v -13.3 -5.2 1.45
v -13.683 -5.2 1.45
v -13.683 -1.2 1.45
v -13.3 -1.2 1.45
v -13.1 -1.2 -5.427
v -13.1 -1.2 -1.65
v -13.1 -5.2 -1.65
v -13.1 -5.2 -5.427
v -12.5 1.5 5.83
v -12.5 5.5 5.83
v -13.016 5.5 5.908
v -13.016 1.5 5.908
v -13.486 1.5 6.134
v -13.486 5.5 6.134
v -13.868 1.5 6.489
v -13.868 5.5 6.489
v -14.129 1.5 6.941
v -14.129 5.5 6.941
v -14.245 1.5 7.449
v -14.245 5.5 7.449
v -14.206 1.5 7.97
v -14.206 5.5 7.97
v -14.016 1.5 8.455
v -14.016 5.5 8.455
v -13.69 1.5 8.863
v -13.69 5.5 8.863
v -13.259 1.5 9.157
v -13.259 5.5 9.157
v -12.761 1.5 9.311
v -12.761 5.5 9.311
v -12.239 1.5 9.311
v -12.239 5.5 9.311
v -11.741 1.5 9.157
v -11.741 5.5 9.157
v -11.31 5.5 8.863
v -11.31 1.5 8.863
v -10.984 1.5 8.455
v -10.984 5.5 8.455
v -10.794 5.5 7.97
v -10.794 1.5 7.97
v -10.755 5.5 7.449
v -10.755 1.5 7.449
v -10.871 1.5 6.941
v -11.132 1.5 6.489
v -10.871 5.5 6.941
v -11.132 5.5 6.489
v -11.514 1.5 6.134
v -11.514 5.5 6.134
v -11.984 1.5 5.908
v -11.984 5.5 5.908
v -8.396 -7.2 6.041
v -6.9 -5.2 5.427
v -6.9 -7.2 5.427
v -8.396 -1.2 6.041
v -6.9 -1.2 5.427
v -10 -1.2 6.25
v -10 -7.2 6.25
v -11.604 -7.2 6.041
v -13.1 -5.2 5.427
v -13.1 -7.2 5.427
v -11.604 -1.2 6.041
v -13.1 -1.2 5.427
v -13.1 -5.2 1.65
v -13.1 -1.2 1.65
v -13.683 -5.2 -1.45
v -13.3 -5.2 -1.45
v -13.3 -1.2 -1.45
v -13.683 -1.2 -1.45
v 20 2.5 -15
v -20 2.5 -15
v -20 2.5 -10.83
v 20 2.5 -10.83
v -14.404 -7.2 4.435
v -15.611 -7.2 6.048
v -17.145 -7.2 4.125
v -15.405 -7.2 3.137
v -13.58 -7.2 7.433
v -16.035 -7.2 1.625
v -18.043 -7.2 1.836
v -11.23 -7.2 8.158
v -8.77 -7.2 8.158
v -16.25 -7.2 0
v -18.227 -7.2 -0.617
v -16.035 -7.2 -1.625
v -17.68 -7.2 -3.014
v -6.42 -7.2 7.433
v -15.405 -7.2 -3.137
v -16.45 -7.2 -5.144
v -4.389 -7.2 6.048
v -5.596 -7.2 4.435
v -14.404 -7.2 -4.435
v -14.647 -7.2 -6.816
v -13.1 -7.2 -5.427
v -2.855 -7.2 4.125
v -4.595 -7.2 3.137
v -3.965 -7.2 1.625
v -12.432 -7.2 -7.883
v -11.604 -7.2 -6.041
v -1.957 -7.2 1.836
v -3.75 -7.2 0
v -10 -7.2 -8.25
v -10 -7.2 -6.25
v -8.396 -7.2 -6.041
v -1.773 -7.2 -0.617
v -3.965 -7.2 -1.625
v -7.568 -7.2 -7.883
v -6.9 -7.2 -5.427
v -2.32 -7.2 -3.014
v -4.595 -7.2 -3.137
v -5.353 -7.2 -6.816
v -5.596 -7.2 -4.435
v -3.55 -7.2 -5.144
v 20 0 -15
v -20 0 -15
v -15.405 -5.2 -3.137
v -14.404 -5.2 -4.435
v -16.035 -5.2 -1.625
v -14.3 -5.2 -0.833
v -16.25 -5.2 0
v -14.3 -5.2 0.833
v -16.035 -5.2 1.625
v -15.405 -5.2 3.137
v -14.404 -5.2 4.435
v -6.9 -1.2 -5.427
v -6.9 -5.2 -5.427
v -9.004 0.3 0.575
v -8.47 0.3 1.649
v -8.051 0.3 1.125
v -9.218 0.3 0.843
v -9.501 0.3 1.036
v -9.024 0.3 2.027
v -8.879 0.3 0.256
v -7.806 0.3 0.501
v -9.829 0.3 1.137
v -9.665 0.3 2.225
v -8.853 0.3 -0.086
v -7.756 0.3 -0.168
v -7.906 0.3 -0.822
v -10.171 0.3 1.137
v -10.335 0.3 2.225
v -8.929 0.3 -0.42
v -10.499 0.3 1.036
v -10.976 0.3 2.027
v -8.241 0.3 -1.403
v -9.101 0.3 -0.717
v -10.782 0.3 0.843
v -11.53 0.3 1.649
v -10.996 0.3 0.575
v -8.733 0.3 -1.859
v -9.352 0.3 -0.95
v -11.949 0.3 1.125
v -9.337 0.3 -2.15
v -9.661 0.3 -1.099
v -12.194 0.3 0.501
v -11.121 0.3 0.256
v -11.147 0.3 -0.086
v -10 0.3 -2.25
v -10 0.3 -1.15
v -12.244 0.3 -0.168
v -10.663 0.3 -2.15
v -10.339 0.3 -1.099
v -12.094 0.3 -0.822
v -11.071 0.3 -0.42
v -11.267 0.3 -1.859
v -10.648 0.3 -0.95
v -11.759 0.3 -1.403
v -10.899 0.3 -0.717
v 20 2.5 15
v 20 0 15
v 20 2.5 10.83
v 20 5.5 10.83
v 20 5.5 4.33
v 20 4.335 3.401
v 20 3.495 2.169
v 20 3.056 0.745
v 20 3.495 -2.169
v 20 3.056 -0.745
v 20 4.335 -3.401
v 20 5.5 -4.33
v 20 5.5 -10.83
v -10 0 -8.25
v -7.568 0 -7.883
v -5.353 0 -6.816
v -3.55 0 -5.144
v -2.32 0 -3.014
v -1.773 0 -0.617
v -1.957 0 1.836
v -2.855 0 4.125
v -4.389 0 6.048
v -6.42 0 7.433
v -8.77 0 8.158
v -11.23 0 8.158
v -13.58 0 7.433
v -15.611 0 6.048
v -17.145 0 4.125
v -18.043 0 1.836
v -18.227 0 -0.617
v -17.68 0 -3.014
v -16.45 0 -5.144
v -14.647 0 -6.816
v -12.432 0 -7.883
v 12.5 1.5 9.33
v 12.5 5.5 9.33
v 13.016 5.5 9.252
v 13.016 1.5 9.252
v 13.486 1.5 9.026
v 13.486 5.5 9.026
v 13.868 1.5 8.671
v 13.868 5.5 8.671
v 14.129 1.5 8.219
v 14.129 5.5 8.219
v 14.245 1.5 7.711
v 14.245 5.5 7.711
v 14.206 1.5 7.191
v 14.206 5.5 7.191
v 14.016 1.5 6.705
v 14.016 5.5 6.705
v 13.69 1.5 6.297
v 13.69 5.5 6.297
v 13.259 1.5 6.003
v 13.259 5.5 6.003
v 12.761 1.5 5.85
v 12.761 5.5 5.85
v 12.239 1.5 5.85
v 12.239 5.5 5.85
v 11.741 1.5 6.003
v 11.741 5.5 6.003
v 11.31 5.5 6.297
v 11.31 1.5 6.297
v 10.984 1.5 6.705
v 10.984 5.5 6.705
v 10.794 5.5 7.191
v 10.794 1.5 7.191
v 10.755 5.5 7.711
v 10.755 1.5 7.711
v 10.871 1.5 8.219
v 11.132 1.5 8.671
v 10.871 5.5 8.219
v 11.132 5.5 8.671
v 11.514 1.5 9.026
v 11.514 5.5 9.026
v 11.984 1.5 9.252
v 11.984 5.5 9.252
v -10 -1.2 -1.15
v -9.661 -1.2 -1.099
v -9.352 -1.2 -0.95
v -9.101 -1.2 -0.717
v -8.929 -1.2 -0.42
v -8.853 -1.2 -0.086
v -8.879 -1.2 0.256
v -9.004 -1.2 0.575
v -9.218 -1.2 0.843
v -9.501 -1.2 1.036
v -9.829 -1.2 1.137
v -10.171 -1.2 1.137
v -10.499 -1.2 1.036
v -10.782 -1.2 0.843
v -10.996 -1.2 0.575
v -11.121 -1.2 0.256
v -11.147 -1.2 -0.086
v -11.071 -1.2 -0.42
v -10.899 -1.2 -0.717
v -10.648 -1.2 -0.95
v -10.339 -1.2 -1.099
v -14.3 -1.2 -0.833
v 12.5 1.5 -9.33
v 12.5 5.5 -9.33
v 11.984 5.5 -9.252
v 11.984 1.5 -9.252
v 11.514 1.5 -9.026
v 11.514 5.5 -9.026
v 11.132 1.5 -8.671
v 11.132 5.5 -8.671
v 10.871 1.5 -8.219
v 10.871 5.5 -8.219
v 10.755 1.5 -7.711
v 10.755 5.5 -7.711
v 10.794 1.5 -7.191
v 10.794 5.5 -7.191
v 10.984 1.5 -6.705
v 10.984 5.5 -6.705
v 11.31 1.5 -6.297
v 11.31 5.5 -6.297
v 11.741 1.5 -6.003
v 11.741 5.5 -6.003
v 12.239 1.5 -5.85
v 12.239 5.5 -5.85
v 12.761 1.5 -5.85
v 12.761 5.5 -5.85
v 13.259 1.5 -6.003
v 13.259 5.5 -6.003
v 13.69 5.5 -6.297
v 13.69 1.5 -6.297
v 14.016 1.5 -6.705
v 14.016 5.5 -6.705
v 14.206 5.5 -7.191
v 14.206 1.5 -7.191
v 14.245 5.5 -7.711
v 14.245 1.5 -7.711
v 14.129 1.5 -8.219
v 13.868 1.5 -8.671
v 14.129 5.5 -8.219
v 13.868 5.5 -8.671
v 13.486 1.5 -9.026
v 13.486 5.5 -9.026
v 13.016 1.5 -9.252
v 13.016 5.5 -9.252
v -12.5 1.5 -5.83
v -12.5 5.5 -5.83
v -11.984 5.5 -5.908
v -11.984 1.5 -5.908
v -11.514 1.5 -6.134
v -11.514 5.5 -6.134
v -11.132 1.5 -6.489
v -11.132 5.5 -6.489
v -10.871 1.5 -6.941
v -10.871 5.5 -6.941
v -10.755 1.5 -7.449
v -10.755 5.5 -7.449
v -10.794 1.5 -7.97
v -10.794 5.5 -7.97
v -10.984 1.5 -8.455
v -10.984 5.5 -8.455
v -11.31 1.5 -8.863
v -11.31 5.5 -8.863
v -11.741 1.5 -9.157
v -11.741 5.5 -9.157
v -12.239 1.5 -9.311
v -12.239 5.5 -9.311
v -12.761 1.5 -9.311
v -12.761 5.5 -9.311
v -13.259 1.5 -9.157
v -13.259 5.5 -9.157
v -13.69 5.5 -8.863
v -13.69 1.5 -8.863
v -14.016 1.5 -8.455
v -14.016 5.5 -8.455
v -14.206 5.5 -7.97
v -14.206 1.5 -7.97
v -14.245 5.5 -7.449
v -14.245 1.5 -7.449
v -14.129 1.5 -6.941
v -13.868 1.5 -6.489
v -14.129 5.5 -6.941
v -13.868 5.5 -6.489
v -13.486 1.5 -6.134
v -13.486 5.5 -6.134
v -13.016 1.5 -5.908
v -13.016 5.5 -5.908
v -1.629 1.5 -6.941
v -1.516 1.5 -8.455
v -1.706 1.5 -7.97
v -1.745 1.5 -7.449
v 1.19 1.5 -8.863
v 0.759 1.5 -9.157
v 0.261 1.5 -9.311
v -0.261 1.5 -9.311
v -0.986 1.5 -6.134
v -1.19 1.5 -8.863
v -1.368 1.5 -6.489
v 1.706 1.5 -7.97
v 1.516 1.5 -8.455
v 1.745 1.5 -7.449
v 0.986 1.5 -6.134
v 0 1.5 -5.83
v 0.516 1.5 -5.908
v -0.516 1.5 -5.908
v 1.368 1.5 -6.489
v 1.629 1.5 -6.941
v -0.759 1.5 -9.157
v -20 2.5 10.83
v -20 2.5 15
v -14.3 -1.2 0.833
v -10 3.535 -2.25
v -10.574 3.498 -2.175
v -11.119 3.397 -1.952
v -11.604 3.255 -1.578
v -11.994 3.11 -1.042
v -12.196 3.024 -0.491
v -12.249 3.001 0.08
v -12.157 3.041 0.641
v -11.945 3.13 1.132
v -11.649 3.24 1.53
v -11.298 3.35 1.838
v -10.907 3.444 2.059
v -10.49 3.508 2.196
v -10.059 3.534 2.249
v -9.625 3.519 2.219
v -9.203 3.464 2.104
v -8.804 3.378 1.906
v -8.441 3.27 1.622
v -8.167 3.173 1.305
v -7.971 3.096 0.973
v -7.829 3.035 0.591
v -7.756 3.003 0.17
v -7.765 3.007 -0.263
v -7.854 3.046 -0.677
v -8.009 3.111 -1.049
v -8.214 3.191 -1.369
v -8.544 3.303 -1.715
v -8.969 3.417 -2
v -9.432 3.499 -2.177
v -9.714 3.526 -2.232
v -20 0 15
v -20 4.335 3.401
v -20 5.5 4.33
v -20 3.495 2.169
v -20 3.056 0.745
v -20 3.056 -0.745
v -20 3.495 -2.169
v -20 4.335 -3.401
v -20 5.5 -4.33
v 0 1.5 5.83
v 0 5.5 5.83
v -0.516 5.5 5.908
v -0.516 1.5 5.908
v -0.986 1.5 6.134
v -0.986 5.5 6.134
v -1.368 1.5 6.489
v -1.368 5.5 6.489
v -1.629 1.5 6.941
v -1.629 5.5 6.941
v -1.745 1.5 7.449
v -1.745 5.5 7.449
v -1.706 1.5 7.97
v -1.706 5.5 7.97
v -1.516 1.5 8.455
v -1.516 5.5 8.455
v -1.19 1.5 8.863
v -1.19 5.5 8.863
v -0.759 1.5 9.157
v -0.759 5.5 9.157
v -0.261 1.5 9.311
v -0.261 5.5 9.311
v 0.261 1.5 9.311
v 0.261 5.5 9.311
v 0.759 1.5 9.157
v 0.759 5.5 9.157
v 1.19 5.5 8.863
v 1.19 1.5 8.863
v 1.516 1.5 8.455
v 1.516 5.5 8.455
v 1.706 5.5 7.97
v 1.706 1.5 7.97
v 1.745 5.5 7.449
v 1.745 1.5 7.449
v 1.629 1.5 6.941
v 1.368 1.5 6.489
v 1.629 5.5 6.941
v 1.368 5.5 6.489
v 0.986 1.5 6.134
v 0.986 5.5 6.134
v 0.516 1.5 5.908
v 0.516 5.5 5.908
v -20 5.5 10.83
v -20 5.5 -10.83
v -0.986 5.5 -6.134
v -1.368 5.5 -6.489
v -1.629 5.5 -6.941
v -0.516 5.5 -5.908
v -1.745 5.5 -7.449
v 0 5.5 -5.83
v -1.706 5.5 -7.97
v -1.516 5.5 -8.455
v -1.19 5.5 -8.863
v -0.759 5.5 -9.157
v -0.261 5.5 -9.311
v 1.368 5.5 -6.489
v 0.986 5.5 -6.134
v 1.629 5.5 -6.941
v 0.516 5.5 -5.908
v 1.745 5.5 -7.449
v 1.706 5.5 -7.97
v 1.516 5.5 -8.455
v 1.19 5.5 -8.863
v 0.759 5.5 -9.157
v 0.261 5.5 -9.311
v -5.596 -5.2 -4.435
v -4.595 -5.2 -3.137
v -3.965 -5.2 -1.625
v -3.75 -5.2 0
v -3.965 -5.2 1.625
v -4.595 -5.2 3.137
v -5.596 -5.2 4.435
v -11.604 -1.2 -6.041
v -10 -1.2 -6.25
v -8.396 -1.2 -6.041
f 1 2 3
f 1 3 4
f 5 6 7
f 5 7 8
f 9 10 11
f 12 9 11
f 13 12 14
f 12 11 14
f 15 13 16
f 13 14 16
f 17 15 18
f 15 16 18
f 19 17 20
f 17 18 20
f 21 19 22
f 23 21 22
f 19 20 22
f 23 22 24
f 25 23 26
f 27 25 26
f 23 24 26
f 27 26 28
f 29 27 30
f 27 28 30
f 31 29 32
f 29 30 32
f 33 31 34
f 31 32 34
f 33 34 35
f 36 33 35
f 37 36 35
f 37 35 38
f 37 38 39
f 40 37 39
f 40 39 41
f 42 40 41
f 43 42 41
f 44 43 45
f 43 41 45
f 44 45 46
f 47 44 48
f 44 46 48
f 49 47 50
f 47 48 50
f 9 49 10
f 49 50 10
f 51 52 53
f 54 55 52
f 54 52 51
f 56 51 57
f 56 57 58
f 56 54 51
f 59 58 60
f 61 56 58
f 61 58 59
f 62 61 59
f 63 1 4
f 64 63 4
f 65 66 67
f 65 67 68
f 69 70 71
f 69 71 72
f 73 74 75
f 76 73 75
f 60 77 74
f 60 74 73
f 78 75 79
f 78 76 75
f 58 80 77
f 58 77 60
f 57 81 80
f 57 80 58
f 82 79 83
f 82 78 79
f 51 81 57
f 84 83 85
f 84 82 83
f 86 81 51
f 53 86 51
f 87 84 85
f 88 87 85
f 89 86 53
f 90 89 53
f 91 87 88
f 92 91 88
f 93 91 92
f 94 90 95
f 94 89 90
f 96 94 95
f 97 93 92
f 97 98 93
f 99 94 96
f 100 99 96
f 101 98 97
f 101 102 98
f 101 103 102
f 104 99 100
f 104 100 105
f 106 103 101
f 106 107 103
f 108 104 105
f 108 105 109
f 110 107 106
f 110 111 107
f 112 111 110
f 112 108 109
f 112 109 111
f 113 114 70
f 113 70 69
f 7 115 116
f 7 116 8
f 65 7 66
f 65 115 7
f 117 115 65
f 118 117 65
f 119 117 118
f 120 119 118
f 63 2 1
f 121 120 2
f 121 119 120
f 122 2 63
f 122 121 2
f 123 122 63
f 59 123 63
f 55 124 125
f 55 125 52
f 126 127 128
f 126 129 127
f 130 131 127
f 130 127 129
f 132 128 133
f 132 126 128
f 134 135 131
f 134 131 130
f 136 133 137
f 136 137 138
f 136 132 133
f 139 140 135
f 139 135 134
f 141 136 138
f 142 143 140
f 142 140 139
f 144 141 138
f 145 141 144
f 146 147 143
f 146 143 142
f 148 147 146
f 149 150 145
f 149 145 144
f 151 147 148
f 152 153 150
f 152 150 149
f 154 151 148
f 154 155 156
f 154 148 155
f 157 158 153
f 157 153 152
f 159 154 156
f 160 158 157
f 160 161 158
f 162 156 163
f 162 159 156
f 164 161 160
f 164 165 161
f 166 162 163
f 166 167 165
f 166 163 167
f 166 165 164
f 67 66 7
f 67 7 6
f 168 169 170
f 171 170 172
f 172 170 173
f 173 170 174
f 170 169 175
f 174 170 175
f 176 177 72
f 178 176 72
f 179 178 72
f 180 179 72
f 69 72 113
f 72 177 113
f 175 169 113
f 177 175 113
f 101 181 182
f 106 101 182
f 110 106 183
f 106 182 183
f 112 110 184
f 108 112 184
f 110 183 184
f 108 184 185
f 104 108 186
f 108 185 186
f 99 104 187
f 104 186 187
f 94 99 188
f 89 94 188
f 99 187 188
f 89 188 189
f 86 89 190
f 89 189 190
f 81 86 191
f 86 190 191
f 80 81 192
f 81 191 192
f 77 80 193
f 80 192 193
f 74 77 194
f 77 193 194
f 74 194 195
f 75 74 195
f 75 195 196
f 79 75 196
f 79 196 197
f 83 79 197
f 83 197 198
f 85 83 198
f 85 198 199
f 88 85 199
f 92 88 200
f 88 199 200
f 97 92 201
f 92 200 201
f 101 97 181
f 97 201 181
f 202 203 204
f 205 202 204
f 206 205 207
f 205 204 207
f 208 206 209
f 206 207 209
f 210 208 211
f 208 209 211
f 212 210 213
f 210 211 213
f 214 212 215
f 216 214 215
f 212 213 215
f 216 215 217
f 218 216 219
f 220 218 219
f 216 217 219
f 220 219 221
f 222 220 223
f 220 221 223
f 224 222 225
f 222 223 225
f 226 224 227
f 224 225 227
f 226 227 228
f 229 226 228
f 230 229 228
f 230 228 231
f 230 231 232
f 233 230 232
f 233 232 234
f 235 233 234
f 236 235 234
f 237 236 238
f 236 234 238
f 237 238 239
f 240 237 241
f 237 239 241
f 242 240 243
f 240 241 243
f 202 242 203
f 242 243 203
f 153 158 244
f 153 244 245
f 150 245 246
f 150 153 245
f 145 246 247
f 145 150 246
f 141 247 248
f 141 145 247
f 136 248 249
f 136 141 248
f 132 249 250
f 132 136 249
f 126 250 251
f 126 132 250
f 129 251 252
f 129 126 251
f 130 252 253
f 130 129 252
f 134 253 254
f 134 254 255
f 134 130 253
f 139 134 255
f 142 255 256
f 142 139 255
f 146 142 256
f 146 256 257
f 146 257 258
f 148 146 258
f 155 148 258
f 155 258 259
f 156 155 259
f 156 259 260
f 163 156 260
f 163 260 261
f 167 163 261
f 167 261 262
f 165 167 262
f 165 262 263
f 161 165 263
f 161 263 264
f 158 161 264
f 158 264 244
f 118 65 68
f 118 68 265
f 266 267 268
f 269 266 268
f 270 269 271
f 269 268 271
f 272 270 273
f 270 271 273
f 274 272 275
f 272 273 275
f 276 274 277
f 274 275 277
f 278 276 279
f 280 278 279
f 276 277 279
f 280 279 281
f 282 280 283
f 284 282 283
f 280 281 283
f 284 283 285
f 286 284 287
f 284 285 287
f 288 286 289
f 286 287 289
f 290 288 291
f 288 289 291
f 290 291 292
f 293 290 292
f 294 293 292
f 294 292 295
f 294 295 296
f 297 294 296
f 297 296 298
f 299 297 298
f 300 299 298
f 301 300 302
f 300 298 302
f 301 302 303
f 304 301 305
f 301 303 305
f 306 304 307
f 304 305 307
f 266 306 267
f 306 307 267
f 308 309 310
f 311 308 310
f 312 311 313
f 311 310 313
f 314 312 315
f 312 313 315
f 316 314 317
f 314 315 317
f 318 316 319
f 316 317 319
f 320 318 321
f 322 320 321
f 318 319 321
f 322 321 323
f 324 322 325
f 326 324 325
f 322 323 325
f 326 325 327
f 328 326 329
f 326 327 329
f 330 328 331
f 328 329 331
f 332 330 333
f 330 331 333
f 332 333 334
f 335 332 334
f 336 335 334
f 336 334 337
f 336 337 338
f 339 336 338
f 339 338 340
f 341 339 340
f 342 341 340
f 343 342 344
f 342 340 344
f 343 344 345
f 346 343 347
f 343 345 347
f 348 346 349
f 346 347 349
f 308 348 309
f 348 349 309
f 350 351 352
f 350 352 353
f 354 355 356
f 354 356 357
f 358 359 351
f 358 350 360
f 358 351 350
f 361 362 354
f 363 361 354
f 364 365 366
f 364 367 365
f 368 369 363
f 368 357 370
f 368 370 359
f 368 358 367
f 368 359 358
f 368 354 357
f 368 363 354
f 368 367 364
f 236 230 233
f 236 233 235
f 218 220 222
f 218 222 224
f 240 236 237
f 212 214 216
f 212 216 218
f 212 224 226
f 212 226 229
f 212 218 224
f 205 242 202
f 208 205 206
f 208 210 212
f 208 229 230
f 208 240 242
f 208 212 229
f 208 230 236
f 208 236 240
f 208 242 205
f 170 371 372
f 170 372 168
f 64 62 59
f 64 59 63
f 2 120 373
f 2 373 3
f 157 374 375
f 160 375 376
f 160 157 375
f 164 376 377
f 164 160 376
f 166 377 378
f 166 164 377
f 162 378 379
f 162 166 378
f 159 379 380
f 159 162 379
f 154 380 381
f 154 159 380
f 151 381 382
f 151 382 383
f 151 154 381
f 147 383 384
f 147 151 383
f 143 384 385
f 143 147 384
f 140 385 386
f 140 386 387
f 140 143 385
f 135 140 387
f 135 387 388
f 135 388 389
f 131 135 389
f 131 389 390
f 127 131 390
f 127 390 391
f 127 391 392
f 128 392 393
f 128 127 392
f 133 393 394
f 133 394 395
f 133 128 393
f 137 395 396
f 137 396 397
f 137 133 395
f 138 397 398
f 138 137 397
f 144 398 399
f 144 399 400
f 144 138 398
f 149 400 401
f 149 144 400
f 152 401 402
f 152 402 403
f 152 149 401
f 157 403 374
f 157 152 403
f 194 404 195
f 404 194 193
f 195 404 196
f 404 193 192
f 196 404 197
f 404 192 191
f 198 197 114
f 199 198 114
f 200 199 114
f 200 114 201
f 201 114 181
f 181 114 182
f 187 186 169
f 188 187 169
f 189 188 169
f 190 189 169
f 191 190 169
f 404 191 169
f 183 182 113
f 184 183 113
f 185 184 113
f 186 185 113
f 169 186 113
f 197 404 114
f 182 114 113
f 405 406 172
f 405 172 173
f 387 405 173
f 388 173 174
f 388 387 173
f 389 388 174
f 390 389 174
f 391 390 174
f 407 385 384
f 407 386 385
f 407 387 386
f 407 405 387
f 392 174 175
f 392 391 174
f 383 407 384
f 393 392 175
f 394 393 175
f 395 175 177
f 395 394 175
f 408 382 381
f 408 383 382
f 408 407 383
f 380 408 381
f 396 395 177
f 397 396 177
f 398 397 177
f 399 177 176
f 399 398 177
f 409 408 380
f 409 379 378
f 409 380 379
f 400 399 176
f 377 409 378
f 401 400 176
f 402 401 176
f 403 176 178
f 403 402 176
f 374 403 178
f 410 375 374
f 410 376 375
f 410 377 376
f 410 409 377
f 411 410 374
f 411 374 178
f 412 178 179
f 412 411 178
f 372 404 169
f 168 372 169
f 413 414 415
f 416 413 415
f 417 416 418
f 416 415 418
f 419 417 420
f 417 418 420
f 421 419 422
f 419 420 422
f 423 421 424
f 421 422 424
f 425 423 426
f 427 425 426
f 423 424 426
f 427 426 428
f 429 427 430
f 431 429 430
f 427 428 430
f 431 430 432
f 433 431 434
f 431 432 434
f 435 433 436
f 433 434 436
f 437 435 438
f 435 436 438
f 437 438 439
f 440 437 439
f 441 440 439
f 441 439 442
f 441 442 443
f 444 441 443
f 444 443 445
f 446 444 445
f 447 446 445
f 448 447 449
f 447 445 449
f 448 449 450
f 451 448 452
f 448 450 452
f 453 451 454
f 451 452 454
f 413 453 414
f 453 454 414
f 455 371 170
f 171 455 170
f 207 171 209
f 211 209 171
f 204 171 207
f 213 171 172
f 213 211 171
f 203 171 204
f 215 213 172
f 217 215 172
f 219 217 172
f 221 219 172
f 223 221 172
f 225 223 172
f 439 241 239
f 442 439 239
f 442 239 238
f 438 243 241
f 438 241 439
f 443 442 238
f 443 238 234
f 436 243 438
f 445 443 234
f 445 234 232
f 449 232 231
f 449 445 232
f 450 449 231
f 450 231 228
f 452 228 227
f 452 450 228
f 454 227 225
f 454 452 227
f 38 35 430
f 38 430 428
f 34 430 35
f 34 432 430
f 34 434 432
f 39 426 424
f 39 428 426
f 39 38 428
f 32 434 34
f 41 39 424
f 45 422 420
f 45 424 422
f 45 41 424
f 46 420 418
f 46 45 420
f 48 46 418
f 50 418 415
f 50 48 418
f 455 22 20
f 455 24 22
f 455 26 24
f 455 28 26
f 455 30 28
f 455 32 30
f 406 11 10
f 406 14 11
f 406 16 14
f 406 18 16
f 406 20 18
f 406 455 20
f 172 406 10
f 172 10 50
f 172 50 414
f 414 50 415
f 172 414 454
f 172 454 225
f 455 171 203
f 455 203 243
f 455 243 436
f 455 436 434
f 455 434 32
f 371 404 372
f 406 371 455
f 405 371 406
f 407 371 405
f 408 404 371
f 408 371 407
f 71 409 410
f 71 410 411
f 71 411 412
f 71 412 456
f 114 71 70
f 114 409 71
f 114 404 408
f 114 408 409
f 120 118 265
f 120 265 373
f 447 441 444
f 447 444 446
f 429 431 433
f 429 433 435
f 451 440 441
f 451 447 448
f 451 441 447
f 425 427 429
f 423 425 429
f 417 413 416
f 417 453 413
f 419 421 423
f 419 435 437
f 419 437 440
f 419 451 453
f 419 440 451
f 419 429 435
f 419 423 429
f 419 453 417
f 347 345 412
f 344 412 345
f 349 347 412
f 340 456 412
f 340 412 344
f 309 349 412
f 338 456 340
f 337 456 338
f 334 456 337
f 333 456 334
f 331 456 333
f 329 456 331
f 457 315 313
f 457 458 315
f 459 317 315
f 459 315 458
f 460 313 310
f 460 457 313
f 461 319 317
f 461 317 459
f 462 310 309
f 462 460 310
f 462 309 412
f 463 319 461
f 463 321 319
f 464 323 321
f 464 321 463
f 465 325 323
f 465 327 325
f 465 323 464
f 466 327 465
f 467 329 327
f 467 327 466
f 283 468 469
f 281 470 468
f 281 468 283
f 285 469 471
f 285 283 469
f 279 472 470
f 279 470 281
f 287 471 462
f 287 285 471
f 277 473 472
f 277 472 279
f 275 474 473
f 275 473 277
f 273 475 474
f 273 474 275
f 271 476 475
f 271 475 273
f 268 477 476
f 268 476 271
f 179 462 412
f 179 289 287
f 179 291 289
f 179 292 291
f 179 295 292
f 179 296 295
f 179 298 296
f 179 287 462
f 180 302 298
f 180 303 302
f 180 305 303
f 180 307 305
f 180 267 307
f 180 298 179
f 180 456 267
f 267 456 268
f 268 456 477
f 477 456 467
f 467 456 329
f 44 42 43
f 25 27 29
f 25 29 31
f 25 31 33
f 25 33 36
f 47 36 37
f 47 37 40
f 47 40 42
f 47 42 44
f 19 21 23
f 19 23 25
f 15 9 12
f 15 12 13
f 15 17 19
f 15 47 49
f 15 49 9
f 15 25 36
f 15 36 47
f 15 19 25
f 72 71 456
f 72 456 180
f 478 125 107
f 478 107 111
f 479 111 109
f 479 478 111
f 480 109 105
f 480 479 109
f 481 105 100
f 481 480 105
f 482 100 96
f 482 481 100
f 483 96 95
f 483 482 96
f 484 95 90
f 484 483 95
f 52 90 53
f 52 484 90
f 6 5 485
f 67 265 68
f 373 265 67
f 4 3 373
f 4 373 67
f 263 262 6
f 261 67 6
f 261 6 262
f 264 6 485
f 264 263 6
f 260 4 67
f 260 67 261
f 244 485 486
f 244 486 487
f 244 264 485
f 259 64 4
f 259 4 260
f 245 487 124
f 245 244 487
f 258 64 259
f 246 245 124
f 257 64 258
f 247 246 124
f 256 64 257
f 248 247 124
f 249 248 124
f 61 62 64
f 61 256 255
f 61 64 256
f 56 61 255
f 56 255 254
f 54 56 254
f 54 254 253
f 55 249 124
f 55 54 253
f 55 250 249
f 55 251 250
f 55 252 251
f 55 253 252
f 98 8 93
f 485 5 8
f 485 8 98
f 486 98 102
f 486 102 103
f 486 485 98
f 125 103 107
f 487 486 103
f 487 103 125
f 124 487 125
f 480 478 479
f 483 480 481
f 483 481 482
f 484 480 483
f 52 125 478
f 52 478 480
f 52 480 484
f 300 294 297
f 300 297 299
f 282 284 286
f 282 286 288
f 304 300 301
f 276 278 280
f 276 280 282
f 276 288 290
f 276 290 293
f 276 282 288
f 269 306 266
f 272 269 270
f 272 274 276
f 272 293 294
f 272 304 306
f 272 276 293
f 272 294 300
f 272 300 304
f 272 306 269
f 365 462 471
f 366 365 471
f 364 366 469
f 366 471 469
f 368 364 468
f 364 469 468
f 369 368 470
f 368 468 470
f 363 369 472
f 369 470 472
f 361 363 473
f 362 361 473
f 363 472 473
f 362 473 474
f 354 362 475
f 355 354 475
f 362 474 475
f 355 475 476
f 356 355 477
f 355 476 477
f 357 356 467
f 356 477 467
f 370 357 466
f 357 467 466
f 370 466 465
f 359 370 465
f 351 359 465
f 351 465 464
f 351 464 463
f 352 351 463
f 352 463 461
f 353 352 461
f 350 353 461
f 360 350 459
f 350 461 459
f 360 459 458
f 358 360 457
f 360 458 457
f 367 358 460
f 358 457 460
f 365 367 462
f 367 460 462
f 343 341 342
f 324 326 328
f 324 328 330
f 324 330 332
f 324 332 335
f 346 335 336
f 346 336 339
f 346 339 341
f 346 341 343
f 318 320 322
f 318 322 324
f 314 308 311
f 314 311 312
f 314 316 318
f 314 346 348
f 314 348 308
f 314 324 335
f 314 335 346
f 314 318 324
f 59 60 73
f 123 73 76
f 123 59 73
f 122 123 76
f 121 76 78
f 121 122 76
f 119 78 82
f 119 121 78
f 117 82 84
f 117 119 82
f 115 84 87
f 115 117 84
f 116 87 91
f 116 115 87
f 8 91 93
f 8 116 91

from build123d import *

# Parameters (mm, degrees)
SKETCH_1_W                           = 40
SKETCH_1_H                           = 30
EXTRUDE_1_DEPTH                      = 2.5
SKETCH_2_R                           = 8.25
EXTRUDE_2_DEPTH                      = 7.2
CUT_EXTRUDE_START                    = -2
SKETCH_3_R                           = 6.25
CUT_EXTRUDE_1_DEPTH                  = 2
EXTRUDE_4_DEPTH                      = 1.2
SKETCH_4_R                           = 1.15
CUT_EXTRUDE_2_DEPTH                  = 3.7
CUT_EXTRUDE_4_DEPTH                  = 4
CHAMFER_1_SIZE                       = 0.2
EXTRUDE_5_DEPTH                      = 40
SKETCH_9_R                           = 2.25
CUT_EXTRUDE_5_DEPTH                  = 2.2
CUT_EXTRUDE_5_DIRECTION_2_REACH      = 28.816
CUT_EXTRUDE_5_DIRECTION_2_END_RADIUS = 5
SKETCH_13_W                          = 40
SKETCH_13_H                          = 5
EXTRUDE_6_DEPTH                      = 3
SKETCH_14_R                          = 1.75
CUT_EXTRUDE_7_DEPTH                  = 4


with BuildPart() as part:
    # Эскиз1 → Бобышка-Вытянуть1 (new body)
    with BuildSketch(Plane(origin=(0, 0, 0), x_dir=(1, 0, 0), z_dir=(0, 1, 0))):
        Rectangle(SKETCH_1_W, SKETCH_1_H)
    extrude(amount=EXTRUDE_1_DEPTH)

    # Эскиз2 → Бобышка-Вытянуть2 (add)
    with BuildSketch(Plane.XZ):
        with Locations(Location((-10, 0, 0), (0, 0, 270))):
            Circle(SKETCH_2_R)
        with BuildLine():
            Line((-13.1, 5.427015755), (-13.1, -5.427015755))
            ThreePointArc((-13.1, -5.427015755), (-10, -6.25), (-6.9, -5.427015755))
            Line((-6.9, -5.427015755), (-6.9, 5.427015755))
            ThreePointArc((-6.9, 5.427015755), (-10, 6.25), (-13.1, 5.427015755))
        make_face(mode=Mode.SUBTRACT)
    extrude(amount=EXTRUDE_2_DEPTH)

    # Эскиз3 → Вырез-Вытянуть1 (cut)
    with BuildSketch(Plane.XZ.offset(7.2).offset(CUT_EXTRUDE_START)):
        with Locations(Location((-10, 0, 0), (0, 0, 60.264286892))):
            Circle(SKETCH_3_R)
    extrude(amount=CUT_EXTRUDE_1_DEPTH, mode=Mode.SUBTRACT)

    # Эскиз8 → Бобышка-Вытянуть4 (add)
    with BuildSketch(Plane.XZ):
        with BuildLine():
            Line((-13.1, 5.427015755), (-13.1, -5.427015755))
            ThreePointArc((-13.1, -5.427015755), (-10, -6.25), (-6.9, -5.427015755))
            Line((-6.9, -5.427015755), (-6.9, 5.427015755))
            ThreePointArc((-6.9, 5.427015755), (-10, 6.25), (-13.1, 5.427015755))
        make_face()
    extrude(amount=EXTRUDE_4_DEPTH)

    # Эскиз4 → Вырез-Вытянуть2 (cut)
    with BuildSketch(Plane.XZ.offset(-2.5)):
        with Locations(Location((-10, 0, 0), (0, 0, 270))):
            Circle(SKETCH_4_R)
    extrude(amount=CUT_EXTRUDE_2_DEPTH, mode=Mode.SUBTRACT)

    # Эскиз6 → Вырез-Вытянуть4 (cut)
    with BuildSketch(Plane.XZ.offset(5.2)):
        Polygon((-13.1, 1.25), (-13.1, -1.25), (-13.1, -1.45), (-13.682842712, -1.45), (-14.3, -0.832842712), (-14.3, 0.832842712), (-13.682842712, 1.45), (-13.1, 1.45), align=None)
    extrude(amount=-CUT_EXTRUDE_4_DEPTH, mode=Mode.SUBTRACT)

    # Фаска1
    chamfer_1_edges = [part.edges().sort_by_distance(p)[0] for p in [
        (-13.1, -3.2, -1.45),
        (-13.1, -3.2, 1.45),
    ]]
    chamfer(chamfer_1_edges, length=CHAMFER_1_SIZE)

    # Эскиз10 → Бобышка-Вытянуть5 (add)
    with BuildSketch(Plane.ZY.offset(20)):
        with BuildLine():
            Line((-5.830127019, 5.5), (-5.830127019, 2.5))
            Line((-5.830127019, 2.5), (5.830127019, 2.5))
            Line((5.830127019, 2.5), (5.830127019, 5.5))
            Line((5.830127019, 5.5), (4.330127019, 5.5))
            ThreePointArc((4.330127019, 5.5), (0, 3), (-4.330127019, 5.5))
            Line((-4.330127019, 5.5), (-5.830127019, 5.5))
        make_face()
    extrude(amount=-EXTRUDE_5_DEPTH)

    # Эскиз9 → Вырез-Вытянуть5 (cut)
    with BuildSketch(Plane(origin=(0, 2.5, 0), x_dir=(1, 0, 0), z_dir=(0, 1, 0))):
        with Locations(Location((-10, 0, 0), (0, 0, 90))):
            Circle(SKETCH_9_R)
    extrude(amount=-CUT_EXTRUDE_5_DEPTH, mode=Mode.SUBTRACT)

    # Вырез-Вытянуть5 direction 2: up to this cylinder (the profile starts outside it)
    cut_extrude_5_direction_2_end = Plane(origin=(-10, 8, 0), z_dir=(-1, 0, 0)) * Cylinder(CUT_EXTRUDE_5_DIRECTION_2_END_RADIUS, 68.632, mode=Mode.PRIVATE)
    # Эскиз9 → Вырез-Вытянуть5 direction 2 (cut, up to the surface)
    with BuildSketch(Plane(origin=(0, 2.5, 0), x_dir=(1, 0, 0), z_dir=(0, 1, 0)), mode=Mode.PRIVATE) as cut_extrude_5_direction_2_sk1:
        with Locations(Location((-10, 0, 0), (0, 0, 90))):
            Circle(SKETCH_9_R)
    cut_extrude_5_direction_2_tool1 = extrude(cut_extrude_5_direction_2_sk1.sketch, amount=CUT_EXTRUDE_5_DIRECTION_2_REACH, mode=Mode.PRIVATE) - cut_extrude_5_direction_2_end
    add(cut_extrude_5_direction_2_tool1.solids().sort_by_distance((-10, 2.5, 0))[0], mode=Mode.SUBTRACT)

    # Эскиз13 → Бобышка-Вытянуть6 (add)
    with BuildSketch(Plane(origin=(0, 2.5, 0), x_dir=(1, 0, 0), z_dir=(0, 1, 0))):
        with Locations((0, 8.330127019)):
            Rectangle(SKETCH_13_W, SKETCH_13_H)
        with Locations((0, -8.330127019)):
            Rectangle(SKETCH_13_W, SKETCH_13_H)
    extrude(amount=EXTRUDE_6_DEPTH)

    # Эскиз14 → Вырез-Вытянуть7 (cut)
    with BuildSketch(Plane(origin=(0, 5.5, 0), x_dir=(1, 0, 0), z_dir=(0, 1, 0))):
        with Locations(Location((-12.5, 7.580127019, 0), (0, 0, 270))):
            Circle(SKETCH_14_R)
        with Locations(Location((12.5, 7.580127019, 0), (0, 0, 90))):
            Circle(SKETCH_14_R)
        with Locations(Location((0, 7.580127019, 0), (0, 0, 270))):
            Circle(SKETCH_14_R)
        with Locations(Location((12.5, -7.580127019, 0), (0, 0, 270))):
            Circle(SKETCH_14_R)
        with Locations(Location((0, -7.580127019, 0), (0, 0, 90))):
            Circle(SKETCH_14_R)
        with Locations(Location((-12.5, -7.580127019, 0), (0, 0, 90))):
            Circle(SKETCH_14_R)
    extrude(amount=-CUT_EXTRUDE_7_DEPTH, mode=Mode.SUBTRACT)


solid = part.part
